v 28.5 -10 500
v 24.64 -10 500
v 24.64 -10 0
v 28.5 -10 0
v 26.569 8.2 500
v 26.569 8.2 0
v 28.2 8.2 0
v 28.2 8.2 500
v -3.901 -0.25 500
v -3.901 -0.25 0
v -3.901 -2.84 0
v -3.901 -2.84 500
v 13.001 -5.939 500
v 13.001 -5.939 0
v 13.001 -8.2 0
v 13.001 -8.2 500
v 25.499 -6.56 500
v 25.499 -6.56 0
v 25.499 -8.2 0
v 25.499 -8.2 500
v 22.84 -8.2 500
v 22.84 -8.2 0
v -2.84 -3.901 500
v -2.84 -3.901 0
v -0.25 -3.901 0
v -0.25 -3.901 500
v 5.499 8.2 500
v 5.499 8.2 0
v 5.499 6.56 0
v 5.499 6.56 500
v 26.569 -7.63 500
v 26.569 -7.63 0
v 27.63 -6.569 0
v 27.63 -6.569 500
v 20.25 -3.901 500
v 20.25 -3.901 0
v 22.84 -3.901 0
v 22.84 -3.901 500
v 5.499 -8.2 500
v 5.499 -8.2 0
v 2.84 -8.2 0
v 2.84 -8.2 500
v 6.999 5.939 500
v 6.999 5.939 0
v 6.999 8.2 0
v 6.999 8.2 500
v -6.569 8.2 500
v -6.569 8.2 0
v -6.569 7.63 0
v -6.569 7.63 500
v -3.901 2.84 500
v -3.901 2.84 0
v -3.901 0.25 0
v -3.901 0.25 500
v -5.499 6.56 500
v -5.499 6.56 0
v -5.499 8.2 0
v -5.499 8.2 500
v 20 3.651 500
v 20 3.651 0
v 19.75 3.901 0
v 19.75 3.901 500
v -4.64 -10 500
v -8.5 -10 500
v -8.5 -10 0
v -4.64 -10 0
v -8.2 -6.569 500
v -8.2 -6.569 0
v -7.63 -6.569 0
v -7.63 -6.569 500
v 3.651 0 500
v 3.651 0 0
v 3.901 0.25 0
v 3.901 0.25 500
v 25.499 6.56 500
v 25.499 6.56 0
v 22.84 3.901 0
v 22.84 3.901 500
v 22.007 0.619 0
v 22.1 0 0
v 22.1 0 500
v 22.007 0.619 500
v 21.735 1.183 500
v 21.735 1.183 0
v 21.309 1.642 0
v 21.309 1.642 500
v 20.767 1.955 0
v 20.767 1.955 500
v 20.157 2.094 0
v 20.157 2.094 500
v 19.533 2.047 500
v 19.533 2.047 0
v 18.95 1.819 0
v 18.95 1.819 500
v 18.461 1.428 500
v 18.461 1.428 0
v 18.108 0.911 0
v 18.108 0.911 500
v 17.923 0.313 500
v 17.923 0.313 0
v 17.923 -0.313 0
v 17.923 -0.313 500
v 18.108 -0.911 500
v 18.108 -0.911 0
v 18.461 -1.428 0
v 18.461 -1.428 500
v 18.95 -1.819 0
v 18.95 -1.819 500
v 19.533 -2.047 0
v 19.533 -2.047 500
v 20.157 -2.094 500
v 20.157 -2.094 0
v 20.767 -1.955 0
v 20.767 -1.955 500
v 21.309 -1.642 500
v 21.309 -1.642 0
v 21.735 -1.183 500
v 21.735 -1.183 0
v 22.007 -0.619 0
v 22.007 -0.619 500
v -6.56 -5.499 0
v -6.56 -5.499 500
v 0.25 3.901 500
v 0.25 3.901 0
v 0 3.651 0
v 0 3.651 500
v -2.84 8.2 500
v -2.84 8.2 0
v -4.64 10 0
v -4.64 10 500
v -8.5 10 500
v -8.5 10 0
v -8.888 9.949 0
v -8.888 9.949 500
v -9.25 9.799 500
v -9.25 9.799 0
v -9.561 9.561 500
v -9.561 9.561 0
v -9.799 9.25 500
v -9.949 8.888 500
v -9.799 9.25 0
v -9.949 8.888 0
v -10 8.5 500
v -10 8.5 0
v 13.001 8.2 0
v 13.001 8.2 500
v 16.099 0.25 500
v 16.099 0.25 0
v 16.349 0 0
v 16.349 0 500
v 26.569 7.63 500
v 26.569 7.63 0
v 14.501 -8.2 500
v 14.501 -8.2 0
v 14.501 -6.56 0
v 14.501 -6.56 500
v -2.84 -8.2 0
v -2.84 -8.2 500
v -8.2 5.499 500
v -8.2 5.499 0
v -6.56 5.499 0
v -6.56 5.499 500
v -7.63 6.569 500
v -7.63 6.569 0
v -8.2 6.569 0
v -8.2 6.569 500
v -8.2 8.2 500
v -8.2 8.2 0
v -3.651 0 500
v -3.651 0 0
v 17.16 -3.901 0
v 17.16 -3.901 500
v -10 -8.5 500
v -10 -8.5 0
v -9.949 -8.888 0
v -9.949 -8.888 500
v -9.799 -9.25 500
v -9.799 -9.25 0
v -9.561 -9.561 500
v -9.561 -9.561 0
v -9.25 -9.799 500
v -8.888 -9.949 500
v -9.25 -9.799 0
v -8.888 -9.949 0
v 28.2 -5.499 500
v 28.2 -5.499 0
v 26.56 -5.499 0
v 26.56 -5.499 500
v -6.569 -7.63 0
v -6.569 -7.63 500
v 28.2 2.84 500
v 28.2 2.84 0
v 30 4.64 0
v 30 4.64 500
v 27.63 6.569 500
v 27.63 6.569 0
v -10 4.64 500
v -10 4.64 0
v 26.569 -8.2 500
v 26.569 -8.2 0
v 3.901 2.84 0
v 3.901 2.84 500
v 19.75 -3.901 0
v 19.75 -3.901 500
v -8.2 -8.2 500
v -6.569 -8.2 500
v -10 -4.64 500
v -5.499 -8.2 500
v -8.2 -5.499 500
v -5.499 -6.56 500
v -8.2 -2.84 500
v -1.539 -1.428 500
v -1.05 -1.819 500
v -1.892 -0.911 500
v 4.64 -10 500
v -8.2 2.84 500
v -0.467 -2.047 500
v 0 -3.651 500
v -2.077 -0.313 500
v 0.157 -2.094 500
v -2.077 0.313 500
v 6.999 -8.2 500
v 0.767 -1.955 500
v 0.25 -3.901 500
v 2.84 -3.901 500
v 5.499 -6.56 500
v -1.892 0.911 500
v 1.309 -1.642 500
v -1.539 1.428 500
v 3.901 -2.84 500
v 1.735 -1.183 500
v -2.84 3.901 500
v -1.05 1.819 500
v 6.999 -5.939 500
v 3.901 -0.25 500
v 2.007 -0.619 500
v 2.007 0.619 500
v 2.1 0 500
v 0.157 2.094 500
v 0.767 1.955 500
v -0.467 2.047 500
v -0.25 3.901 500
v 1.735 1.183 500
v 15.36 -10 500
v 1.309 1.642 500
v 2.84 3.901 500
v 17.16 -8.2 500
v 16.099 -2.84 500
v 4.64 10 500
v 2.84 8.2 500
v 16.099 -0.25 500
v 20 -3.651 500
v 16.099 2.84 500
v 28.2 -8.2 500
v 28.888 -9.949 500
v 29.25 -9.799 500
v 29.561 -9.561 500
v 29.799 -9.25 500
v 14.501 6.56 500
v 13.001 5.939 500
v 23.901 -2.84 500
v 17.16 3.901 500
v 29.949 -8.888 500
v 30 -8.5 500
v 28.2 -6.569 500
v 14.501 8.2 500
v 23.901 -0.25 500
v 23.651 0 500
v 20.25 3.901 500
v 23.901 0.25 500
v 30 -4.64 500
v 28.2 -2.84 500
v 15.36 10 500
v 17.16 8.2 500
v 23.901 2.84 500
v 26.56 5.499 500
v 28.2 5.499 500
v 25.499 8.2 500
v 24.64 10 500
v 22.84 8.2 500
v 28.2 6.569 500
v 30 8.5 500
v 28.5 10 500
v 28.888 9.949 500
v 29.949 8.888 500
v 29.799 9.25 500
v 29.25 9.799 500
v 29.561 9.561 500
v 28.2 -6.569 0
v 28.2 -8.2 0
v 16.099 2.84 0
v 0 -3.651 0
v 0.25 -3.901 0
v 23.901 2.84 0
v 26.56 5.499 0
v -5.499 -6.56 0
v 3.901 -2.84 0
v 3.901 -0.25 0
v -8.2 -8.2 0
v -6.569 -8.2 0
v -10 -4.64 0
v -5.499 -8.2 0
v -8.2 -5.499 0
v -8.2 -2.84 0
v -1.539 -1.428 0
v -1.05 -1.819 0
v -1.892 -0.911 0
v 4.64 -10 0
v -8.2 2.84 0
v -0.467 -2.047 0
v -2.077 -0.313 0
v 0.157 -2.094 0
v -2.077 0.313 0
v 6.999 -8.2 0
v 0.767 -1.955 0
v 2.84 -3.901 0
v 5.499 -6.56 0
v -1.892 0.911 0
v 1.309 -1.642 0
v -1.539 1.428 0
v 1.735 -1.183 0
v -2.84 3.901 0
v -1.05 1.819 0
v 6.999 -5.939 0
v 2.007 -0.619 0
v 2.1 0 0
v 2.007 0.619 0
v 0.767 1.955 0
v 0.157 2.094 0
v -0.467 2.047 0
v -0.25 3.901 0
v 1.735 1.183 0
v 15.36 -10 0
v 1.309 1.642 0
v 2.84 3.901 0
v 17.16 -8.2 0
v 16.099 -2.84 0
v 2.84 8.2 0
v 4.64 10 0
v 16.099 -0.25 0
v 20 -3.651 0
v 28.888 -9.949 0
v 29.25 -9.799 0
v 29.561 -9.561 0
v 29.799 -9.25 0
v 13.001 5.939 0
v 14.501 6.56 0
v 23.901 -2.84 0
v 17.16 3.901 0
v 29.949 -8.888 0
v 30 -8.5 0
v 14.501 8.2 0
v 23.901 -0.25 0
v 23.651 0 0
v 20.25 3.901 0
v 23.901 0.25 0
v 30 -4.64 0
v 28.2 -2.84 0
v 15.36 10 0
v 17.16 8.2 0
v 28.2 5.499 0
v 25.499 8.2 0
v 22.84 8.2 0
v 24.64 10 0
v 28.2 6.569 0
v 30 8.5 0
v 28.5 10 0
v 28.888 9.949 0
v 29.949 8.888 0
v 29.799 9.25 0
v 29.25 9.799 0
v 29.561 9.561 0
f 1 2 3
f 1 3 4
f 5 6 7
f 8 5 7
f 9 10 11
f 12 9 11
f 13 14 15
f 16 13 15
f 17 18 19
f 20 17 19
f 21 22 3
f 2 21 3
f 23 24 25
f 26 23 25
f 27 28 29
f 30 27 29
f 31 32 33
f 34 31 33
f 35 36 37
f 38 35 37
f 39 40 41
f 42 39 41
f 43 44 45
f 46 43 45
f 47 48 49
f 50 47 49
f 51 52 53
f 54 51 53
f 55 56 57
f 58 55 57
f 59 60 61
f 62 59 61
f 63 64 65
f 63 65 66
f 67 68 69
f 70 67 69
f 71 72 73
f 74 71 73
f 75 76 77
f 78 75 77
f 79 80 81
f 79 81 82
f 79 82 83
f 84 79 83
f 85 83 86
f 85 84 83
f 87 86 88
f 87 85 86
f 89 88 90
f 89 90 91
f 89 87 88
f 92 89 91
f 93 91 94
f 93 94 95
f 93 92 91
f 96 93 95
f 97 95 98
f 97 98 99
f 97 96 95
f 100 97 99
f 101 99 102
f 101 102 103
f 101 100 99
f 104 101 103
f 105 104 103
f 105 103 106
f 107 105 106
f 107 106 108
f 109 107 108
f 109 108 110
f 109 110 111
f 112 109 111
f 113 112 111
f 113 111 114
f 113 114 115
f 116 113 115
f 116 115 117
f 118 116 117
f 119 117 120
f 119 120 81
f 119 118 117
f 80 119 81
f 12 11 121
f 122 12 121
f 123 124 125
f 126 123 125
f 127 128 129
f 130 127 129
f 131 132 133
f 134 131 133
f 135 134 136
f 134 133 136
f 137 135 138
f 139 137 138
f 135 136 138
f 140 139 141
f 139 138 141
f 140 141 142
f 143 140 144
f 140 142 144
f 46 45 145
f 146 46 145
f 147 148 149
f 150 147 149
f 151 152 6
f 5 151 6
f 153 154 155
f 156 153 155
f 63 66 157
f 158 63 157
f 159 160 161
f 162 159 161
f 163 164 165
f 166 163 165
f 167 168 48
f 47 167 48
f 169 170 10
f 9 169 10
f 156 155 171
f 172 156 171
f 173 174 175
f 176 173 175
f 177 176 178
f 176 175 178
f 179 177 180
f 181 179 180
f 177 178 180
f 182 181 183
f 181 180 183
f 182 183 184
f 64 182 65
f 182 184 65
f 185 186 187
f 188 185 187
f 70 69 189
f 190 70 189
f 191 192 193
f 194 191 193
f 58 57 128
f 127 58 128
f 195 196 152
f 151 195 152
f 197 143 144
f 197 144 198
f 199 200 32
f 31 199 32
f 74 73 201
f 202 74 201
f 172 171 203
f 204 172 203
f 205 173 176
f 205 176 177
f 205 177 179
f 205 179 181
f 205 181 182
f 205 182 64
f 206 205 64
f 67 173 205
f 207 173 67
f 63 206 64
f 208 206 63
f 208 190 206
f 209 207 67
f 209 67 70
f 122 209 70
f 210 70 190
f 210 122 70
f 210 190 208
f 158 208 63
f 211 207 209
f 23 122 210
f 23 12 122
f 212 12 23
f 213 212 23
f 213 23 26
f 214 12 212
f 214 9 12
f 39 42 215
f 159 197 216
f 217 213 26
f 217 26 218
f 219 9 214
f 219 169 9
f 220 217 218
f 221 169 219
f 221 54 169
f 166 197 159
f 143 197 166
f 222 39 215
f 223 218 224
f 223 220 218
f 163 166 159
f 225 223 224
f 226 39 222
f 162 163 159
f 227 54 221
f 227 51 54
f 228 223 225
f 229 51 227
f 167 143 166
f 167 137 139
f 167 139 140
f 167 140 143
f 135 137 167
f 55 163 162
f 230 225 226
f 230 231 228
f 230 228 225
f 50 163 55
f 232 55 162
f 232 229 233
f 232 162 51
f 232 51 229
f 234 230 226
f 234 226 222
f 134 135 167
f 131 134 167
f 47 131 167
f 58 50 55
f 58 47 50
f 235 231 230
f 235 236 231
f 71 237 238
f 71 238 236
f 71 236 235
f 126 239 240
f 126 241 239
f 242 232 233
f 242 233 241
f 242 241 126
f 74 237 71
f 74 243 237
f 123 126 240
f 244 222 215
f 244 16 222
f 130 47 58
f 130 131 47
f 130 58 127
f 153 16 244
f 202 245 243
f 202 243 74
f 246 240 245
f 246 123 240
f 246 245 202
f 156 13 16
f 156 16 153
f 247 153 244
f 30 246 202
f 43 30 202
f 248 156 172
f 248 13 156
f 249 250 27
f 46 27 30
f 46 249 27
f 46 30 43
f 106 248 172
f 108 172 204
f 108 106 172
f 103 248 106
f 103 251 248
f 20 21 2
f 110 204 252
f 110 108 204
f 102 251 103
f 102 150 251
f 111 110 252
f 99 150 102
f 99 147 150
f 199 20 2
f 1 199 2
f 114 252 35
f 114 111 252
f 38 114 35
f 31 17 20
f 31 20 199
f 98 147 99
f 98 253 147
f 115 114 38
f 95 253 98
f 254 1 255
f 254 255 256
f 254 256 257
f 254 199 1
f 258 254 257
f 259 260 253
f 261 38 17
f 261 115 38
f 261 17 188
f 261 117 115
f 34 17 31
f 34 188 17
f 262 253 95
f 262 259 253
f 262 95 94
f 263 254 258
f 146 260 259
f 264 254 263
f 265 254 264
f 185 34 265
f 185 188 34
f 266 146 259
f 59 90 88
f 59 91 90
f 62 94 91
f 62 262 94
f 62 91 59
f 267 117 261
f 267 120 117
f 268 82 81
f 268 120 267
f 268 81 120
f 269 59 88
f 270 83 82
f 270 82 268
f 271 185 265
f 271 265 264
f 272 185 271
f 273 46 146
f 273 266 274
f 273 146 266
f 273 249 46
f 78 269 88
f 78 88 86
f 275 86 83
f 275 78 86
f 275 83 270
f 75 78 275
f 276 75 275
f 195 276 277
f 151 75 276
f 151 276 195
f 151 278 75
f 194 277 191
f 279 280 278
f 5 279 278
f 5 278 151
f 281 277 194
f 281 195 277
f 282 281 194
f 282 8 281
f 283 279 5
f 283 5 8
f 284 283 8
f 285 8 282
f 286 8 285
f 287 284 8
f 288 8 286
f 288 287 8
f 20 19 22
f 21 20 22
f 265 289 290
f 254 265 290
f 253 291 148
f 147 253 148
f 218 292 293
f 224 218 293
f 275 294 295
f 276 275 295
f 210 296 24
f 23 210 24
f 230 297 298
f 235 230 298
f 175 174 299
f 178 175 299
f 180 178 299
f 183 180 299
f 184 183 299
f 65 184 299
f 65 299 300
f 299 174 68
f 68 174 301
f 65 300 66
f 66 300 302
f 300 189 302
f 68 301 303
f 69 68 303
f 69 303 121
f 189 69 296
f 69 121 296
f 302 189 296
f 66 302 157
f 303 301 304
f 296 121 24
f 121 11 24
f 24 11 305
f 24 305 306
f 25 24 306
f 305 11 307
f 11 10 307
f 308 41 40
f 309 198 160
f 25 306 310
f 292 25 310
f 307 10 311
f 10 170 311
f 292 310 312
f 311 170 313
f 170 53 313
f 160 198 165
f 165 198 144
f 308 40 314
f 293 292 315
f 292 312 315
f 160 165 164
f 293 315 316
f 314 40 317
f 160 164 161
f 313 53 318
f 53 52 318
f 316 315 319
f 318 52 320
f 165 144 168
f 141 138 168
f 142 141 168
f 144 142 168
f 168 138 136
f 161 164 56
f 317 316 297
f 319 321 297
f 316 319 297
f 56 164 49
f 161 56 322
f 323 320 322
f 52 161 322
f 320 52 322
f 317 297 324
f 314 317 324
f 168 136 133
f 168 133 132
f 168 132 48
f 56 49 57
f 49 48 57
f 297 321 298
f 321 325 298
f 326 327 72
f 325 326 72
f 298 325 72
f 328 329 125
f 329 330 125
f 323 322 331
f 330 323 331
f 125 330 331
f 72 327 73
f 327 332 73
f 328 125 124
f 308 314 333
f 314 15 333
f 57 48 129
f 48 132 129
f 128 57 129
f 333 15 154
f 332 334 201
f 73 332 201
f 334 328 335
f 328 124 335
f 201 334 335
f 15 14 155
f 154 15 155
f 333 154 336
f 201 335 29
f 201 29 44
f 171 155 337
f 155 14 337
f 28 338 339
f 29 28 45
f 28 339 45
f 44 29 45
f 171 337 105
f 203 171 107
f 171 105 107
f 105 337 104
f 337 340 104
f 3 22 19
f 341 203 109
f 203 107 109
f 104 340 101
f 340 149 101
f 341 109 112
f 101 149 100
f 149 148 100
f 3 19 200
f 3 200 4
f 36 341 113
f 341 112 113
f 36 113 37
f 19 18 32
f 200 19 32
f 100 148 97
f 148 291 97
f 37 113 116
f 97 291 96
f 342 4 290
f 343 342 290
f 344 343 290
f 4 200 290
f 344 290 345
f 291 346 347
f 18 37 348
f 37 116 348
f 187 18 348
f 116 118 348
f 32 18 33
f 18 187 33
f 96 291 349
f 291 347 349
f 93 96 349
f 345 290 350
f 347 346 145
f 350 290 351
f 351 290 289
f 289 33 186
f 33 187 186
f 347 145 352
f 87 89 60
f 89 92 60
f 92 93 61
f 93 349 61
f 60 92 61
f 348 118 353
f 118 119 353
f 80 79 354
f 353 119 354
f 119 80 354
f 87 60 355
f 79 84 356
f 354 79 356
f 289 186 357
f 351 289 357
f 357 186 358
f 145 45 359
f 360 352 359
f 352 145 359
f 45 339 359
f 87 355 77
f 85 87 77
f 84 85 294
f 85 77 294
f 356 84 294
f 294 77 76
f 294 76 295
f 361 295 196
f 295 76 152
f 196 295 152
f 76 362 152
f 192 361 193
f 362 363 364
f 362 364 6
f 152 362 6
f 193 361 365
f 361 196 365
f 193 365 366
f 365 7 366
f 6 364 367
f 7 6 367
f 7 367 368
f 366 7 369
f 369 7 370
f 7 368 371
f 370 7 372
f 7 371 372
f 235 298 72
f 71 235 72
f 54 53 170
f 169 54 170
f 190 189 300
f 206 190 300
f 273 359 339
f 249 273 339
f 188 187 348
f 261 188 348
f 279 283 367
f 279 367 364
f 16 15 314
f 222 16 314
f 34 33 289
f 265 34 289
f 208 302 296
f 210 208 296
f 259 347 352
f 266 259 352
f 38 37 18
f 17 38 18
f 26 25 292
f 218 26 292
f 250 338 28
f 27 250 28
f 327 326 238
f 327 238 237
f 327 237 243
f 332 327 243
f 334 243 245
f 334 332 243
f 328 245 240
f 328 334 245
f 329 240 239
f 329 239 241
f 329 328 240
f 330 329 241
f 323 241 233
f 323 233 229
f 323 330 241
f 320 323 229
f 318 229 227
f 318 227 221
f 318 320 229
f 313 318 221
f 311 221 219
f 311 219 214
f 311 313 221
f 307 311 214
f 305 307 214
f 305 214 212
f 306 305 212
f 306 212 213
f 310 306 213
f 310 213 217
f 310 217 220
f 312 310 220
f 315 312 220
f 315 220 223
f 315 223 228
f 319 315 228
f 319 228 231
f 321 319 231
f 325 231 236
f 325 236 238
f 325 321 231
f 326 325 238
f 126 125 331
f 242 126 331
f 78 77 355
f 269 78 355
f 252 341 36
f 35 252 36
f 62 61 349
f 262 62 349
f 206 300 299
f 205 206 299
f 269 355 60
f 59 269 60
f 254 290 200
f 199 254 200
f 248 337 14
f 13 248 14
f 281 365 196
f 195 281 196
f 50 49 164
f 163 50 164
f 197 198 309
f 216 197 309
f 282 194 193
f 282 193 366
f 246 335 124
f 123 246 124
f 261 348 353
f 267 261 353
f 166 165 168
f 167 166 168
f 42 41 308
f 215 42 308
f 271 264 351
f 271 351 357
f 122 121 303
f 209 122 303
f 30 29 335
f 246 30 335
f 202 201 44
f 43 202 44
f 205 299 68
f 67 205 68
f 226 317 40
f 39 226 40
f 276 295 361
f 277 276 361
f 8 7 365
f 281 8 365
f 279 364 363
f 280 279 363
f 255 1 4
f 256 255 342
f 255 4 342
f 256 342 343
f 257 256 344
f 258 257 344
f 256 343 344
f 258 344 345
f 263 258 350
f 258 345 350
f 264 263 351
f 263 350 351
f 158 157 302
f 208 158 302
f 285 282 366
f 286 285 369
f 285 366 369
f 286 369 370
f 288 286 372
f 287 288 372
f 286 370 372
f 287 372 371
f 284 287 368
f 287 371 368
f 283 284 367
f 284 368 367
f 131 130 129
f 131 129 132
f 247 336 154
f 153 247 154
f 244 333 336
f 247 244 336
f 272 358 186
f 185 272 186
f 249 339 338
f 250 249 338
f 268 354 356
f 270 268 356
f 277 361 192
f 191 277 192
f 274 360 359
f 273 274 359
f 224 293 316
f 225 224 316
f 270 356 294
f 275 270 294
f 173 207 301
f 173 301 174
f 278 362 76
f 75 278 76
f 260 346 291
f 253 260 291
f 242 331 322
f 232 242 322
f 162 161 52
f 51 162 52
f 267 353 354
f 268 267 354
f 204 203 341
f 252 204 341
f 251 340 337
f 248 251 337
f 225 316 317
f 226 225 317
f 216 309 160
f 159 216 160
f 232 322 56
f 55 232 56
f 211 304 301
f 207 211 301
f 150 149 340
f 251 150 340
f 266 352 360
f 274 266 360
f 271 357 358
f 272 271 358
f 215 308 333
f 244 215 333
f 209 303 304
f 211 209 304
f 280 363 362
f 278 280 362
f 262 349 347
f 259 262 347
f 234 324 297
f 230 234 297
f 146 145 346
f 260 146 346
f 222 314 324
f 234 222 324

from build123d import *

# Parameters (mm, degrees)
F0_R     = 2.1
F1_DEPTH = 500


with BuildPart() as f1:
    # F0 (on Top) → F1 (new body)
    with BuildSketch(Plane.XY):
        with BuildLine():
            Line((4.64, -10), (8.5, -10))
            Line((8.5, -10), (11.5, -10))
            Line((11.5, -10), (15.36, -10))
            Line((15.36, -10), (17.16, -8.2))
            Line((17.16, -8.2), (14.50066, -8.2))
            Line((14.50066, -8.2), (14.50066, -6.56))
            Line((14.50066, -6.56), (17.16, -3.90066))
            Line((17.16, -3.90066), (19.75, -3.90066))
            Line((19.75, -3.90066), (20, -3.65066))
            Line((20, -3.65066), (20.25, -3.90066))
            Line((20.25, -3.90066), (22.84, -3.90066))
            Line((22.84, -3.90066), (25.49934, -6.56))
            Line((25.49934, -6.56), (25.49934, -8.2))
            Line((25.49934, -8.2), (22.84, -8.2))
            Line((22.84, -8.2), (24.64, -10))
            Line((24.64, -10), (28.5, -10))
            ThreePointArc((28.5, -10), (29.56066, -9.56066), (30, -8.5))
            Line((30, -8.5), (30, -4.64))
            Line((30, -4.64), (28.2, -2.84))
            Line((28.2, -2.84), (28.2, -5.49934))
            Line((28.2, -5.49934), (26.56, -5.49934))
            Line((26.56, -5.49934), (23.90066, -2.84))
            Line((23.90066, -2.84), (23.90066, -0.25))
            Line((23.90066, -0.25), (23.65066, 0))
            Line((23.65066, 0), (23.90066, 0.25))
            Line((23.90066, 0.25), (23.90066, 2.84))
            Line((23.90066, 2.84), (26.56, 5.49934))
            Line((26.56, 5.49934), (28.2, 5.49934))
            Line((28.2, 5.49934), (28.2, 2.84))
            Line((28.2, 2.84), (30, 4.64))
            Line((30, 4.64), (30, 8.5))
            ThreePointArc((30, 8.5), (29.56066, 9.56066), (28.5, 10))
            Line((28.5, 10), (24.64, 10))
            Line((24.64, 10), (22.84, 8.2))
            Line((22.84, 8.2), (25.49934, 8.2))
            Line((25.49934, 8.2), (25.49934, 6.56))
            Line((25.49934, 6.56), (22.84, 3.90066))
            Line((22.84, 3.90066), (20.25, 3.90066))
            Line((20.25, 3.90066), (20, 3.65066))
            Line((20, 3.65066), (19.75, 3.90066))
            Line((19.75, 3.90066), (17.16, 3.90066))
            Line((17.16, 3.90066), (14.50066, 6.56))
            Line((14.50066, 6.56), (14.50066, 8.2))
            Line((14.50066, 8.2), (17.16, 8.2))
            Line((17.16, 8.2), (15.36, 10))
            Line((15.36, 10), (11.5, 10))
            Line((11.5, 10), (8.5, 10))
            Line((8.5, 10), (4.64, 10))
            Line((4.64, 10), (2.84, 8.2))
            Line((2.84, 8.2), (5.49934, 8.2))
            Line((5.49934, 8.2), (5.49934, 6.56))
            Line((5.49934, 6.56), (2.84, 3.90066))
            Line((2.84, 3.90066), (0.25, 3.90066))
            Line((0.25, 3.90066), (0, 3.65066))
            Line((0, 3.65066), (-0.25, 3.90066))
            Line((-0.25, 3.90066), (-2.84, 3.90066))
            Line((-2.84, 3.90066), (-5.49934, 6.56))
            Line((-5.49934, 6.56), (-5.49934, 8.2))
            Line((-5.49934, 8.2), (-2.84, 8.2))
            Line((-2.84, 8.2), (-4.64, 10))
            Line((-4.64, 10), (-8.5, 10))
            ThreePointArc((-8.5, 10), (-9.56066, 9.56066), (-10, 8.5))
            Line((-10, 8.5), (-10, 4.64))
            Line((-10, 4.64), (-8.2, 2.84))
            Line((-8.2, 2.84), (-8.2, 5.49934))
            Line((-8.2, 5.49934), (-6.56, 5.49934))
            Line((-6.56, 5.49934), (-3.90066, 2.84))
            Line((-3.90066, 2.84), (-3.90066, 0.25))
            Line((-3.90066, 0.25), (-3.65066, 0))
            Line((-3.65066, 0), (-3.90066, -0.25))
            Line((-3.90066, -0.25), (-3.90066, -2.84))
            Line((-3.90066, -2.84), (-6.56, -5.49934))
            Line((-6.56, -5.49934), (-8.2, -5.49934))
            Line((-8.2, -5.49934), (-8.2, -2.84))
            Line((-8.2, -2.84), (-10, -4.64))
            Line((-10, -4.64), (-10, -8.5))
            ThreePointArc((-10, -8.5), (-9.56066, -9.56066), (-8.5, -10))
            Line((-8.5, -10), (-4.64, -10))
            Line((-4.64, -10), (-2.84, -8.2))
            Line((-2.84, -8.2), (-5.49934, -8.2))
            Line((-5.49934, -8.2), (-5.49934, -6.56))
            Line((-5.49934, -6.56), (-2.84, -3.90066))
            Line((-2.84, -3.90066), (-0.25, -3.90066))
            Line((-0.25, -3.90066), (0, -3.65066))
            Line((0, -3.65066), (0.25, -3.90066))
            Line((0.25, -3.90066), (2.84, -3.90066))
            Line((2.84, -3.90066), (5.49934, -6.56))
            Line((5.49934, -6.56), (5.49934, -8.2))
            Line((5.49934, -8.2), (2.84, -8.2))
            Line((2.84, -8.2), (4.64, -10))
        make_face()
        Polygon((-6.56934, -7.63), (-6.56934, -8.2), (-8.2, -8.2), (-8.2, -6.56934), (-7.63, -6.56934), align=None, mode=Mode.SUBTRACT)
        Polygon((27.63, -6.56934), (28.2, -6.56934), (28.2, -8.2), (26.56934, -8.2), (26.56934, -7.63), align=None, mode=Mode.SUBTRACT)
        Circle(F0_R, mode=Mode.SUBTRACT)
        Polygon((-7.63, 6.56934), (-8.2, 6.56934), (-8.2, 8.2), (-6.56934, 8.2), (-6.56934, 7.63), align=None, mode=Mode.SUBTRACT)
        Polygon((3.90066, 2.84), (6.56, 5.49934), (6.99934, 5.93868), (6.99934, 8.2), (13.00066, 8.2), (13.00066, 5.93868), (13.44, 5.49934), (16.09934, 2.84), (16.09934, 0.25), (16.34934, 0), (16.09934, -0.25), (16.09934, -2.84), (13.44, -5.49934), (13.00066, -5.93868), (13.00066, -8.2), (6.99934, -8.2), (6.99934, -5.93868), (6.56, -5.49934), (3.90066, -2.84), (3.90066, -0.25), (3.65066, 0), (3.90066, 0.25), align=None, mode=Mode.SUBTRACT)
        with Locations((20, 0)):
            Circle(F0_R, mode=Mode.SUBTRACT)
        Polygon((28.2, 8.2), (28.2, 6.56934), (27.63, 6.56934), (26.56934, 7.63), (26.56934, 8.2), align=None, mode=Mode.SUBTRACT)
    extrude(amount=F1_DEPTH)


solid = f1.part
